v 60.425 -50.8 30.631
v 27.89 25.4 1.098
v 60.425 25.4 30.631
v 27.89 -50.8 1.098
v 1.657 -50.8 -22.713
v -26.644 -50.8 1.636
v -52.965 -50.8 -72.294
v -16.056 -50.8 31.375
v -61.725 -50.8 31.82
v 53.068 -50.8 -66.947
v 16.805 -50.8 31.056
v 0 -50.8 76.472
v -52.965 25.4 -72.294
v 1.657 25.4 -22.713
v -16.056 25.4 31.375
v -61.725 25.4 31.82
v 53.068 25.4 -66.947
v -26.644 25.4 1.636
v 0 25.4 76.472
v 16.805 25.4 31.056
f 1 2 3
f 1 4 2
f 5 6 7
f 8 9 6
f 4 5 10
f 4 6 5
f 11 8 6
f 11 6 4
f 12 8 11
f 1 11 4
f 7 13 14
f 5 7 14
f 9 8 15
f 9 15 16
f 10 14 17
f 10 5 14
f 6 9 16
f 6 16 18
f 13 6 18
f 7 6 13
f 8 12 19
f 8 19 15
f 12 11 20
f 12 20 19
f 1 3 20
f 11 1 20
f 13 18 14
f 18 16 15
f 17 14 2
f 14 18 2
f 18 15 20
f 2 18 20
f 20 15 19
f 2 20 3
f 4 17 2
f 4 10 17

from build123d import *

# Parameters (mm, degrees)
F1_DEPTH = 25.4
F2_DEPTH = 25.4
F3_DEPTH = 25.4


with BuildPart() as f1:
    # F0 (on Front) → F1 (new body)
    with BuildSketch(Plane.XZ):
        Polygon((-26.643926605, 1.6362958008), (1.6566294677, -22.7132987456), (27.8896984995, 1.0984393185), (16.8050068003, 31.0555305972), (-16.0558851046, 31.375344584), align=None)
        Polygon((-61.7250166833, 31.8198129535), (-26.643926605, 1.6362958008), (-16.0558851046, 31.375344584), align=None)
        Polygon((0, 76.4721408486), (-16.0558851046, 31.375344584), (16.8050068003, 31.0555305972), align=None)
        Polygon((16.8050068003, 31.0555305972), (27.8896984995, 1.0984393185), (60.4253225029, 30.6310020387), align=None)
        Polygon((27.8896984995, 1.0984393185), (1.6566294677, -22.7132987456), (53.0678555369, -66.9471472502), align=None)
        Polygon((-26.643926605, 1.6362958008), (-52.9653020203, -72.293587029), (1.6566294677, -22.7132987456), align=None)
    extrude(amount=F1_DEPTH)

    # F2 (add): a face of the model
    f2_faces = [f1.faces().sort_by_distance(p)[0] for p in [
        (-0.3182282883, -25.4, 0.0475680349),
    ]]
    extrude(f2_faces, amount=F2_DEPTH)

    # F3 (add): a face of the model
    f3_faces = [f1.faces().sort_by_distance(p)[0] for p in [
        (-0.3182282883, 0, 0.0475680349),
    ]]
    extrude(f3_faces, amount=F3_DEPTH)


solid = f1.part
